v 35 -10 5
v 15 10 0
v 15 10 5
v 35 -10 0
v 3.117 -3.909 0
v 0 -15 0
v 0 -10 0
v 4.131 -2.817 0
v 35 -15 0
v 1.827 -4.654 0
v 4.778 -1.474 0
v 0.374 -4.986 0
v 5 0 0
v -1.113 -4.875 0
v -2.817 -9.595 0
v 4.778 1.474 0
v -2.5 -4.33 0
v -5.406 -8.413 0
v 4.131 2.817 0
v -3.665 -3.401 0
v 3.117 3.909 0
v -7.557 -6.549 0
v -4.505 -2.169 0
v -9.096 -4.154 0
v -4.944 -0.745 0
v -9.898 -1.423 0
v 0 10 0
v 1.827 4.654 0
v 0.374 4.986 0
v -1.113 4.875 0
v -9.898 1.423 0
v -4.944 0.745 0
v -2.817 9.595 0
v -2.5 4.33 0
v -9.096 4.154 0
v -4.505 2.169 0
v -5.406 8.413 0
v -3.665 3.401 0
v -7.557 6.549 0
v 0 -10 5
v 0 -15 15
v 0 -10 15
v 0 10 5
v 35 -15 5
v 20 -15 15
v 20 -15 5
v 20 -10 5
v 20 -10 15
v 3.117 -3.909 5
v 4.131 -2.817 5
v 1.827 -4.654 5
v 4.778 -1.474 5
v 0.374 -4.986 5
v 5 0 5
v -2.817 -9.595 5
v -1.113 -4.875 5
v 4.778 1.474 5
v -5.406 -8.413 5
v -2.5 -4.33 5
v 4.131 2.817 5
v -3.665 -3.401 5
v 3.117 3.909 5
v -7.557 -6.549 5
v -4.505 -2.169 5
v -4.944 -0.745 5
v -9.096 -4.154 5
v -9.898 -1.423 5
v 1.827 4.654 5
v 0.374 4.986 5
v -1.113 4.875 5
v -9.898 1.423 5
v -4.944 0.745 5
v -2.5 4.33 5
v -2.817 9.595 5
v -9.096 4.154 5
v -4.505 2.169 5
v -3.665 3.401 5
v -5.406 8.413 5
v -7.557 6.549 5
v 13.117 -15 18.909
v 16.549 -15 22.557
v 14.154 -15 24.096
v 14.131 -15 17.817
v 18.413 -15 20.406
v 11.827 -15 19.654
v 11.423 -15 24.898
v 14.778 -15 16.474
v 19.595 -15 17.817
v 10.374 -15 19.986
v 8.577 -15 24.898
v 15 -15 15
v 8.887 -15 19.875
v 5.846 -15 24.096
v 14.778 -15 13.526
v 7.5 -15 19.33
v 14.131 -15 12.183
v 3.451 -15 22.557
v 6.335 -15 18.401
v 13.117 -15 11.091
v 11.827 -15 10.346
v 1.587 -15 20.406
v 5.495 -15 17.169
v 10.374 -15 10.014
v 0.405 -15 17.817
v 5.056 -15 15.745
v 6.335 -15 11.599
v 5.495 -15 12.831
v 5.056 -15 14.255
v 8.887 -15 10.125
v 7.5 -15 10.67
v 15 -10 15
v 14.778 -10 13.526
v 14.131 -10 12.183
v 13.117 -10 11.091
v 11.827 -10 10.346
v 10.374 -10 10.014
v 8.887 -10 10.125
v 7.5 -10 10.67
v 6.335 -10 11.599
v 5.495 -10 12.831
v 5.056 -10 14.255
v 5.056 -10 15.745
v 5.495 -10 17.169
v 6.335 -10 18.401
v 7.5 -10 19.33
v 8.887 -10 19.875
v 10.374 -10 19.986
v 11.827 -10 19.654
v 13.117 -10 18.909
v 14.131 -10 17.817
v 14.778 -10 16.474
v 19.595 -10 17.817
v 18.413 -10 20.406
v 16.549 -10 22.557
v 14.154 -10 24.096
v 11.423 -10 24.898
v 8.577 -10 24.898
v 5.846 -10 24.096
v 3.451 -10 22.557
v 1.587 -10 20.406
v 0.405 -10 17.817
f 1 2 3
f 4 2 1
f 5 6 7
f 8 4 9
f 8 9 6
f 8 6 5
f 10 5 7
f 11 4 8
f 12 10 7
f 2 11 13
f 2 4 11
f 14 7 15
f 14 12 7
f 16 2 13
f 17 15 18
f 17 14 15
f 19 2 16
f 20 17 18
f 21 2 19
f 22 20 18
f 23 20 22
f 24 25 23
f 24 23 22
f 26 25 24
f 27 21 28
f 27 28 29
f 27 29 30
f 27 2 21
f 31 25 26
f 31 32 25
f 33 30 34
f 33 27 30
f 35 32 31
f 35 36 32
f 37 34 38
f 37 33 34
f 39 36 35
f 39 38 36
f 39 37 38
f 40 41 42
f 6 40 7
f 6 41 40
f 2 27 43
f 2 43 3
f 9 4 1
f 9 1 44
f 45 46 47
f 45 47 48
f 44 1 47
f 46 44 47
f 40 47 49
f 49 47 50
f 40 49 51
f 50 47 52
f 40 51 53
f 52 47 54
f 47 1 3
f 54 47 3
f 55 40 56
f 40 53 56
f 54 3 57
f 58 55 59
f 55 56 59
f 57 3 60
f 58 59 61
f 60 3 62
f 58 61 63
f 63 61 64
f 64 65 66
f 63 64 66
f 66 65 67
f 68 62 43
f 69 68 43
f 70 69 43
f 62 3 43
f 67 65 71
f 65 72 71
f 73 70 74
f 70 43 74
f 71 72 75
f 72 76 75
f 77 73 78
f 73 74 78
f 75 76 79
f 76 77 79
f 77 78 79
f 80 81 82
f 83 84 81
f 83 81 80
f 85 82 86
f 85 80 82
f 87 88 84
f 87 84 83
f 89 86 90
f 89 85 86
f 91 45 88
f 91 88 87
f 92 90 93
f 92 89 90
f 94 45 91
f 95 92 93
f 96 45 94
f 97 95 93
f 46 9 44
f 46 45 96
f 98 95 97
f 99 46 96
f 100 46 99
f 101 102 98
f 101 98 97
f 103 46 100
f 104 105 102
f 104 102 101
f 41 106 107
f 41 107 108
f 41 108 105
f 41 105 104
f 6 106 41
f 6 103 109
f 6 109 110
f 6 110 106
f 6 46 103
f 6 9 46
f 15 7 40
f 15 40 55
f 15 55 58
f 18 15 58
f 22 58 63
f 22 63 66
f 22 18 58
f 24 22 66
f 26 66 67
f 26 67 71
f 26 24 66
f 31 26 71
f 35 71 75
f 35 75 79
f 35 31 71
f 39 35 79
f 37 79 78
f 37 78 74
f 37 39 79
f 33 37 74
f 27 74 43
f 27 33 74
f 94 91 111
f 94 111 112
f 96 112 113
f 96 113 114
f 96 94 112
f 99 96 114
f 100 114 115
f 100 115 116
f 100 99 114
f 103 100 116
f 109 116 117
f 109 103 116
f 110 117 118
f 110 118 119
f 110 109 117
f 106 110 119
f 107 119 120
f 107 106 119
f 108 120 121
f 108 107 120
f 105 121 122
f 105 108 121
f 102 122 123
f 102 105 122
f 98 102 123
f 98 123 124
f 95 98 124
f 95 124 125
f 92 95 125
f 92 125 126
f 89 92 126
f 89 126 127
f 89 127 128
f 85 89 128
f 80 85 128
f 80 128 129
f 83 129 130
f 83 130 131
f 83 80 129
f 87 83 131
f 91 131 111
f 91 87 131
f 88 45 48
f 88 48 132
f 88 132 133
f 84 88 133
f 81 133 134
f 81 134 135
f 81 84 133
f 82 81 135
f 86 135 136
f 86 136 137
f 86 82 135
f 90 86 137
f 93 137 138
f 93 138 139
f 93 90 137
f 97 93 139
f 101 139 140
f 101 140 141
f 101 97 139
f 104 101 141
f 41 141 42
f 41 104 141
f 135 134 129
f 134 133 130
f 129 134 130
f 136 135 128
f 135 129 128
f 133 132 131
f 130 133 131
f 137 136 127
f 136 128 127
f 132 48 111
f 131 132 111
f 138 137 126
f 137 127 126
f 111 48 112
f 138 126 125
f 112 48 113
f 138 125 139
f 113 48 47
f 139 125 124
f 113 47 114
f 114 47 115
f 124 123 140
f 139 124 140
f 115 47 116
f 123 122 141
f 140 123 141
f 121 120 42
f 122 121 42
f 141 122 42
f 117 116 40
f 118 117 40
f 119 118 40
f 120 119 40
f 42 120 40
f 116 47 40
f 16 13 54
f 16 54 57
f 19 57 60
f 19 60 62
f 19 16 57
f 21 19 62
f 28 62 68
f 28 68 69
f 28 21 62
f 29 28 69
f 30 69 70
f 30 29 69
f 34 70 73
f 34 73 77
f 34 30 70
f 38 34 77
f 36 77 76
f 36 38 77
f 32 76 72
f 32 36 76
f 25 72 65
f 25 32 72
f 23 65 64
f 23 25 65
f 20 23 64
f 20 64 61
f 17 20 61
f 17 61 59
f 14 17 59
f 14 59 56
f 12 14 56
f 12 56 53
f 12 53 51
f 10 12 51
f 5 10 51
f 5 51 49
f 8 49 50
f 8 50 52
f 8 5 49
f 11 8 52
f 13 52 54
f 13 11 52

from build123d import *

# Parameters (mm, degrees)
SKETCH_1_R      = 5
EXTRUDE_1_DEPTH = 5
EXTRUDE_START   = -15
SKETCH_2_R      = 5
EXTRUDE_2_DEPTH = 5


with BuildPart() as part:
    # 草圖1 → 填料-伸長1 (new body)
    with BuildSketch(Plane.XY):
        with BuildLine():
            Line((0, 10), (15, 10))
            Line((15, 10), (35, -10))
            Line((35, -10), (35, -15))
            Line((35, -15), (0, -15))
            Line((0, -15), (0, -10))
            ThreePointArc((0, -10), (-10, 0), (0, 10))
        make_face()
        Circle(SKETCH_1_R, mode=Mode.SUBTRACT)
    extrude(amount=EXTRUDE_1_DEPTH)

    # 草圖2 → 填料-伸長2 (add)
    with BuildSketch(Plane(origin=(0, 0, 0), x_dir=(1, 0, 0), z_dir=(0, 1, 0)).offset(EXTRUDE_START)):
        with BuildLine():
            Line((0, -15), (0, -5))
            Line((0, -5), (20, -5))
            Line((20, -5), (20, -15))
            ThreePointArc((20, -15), (10, -25), (0, -15))
        make_face()
        with Locations((10, -15)):
            Circle(SKETCH_2_R, mode=Mode.SUBTRACT)
    extrude(amount=EXTRUDE_2_DEPTH)


solid = part.part
